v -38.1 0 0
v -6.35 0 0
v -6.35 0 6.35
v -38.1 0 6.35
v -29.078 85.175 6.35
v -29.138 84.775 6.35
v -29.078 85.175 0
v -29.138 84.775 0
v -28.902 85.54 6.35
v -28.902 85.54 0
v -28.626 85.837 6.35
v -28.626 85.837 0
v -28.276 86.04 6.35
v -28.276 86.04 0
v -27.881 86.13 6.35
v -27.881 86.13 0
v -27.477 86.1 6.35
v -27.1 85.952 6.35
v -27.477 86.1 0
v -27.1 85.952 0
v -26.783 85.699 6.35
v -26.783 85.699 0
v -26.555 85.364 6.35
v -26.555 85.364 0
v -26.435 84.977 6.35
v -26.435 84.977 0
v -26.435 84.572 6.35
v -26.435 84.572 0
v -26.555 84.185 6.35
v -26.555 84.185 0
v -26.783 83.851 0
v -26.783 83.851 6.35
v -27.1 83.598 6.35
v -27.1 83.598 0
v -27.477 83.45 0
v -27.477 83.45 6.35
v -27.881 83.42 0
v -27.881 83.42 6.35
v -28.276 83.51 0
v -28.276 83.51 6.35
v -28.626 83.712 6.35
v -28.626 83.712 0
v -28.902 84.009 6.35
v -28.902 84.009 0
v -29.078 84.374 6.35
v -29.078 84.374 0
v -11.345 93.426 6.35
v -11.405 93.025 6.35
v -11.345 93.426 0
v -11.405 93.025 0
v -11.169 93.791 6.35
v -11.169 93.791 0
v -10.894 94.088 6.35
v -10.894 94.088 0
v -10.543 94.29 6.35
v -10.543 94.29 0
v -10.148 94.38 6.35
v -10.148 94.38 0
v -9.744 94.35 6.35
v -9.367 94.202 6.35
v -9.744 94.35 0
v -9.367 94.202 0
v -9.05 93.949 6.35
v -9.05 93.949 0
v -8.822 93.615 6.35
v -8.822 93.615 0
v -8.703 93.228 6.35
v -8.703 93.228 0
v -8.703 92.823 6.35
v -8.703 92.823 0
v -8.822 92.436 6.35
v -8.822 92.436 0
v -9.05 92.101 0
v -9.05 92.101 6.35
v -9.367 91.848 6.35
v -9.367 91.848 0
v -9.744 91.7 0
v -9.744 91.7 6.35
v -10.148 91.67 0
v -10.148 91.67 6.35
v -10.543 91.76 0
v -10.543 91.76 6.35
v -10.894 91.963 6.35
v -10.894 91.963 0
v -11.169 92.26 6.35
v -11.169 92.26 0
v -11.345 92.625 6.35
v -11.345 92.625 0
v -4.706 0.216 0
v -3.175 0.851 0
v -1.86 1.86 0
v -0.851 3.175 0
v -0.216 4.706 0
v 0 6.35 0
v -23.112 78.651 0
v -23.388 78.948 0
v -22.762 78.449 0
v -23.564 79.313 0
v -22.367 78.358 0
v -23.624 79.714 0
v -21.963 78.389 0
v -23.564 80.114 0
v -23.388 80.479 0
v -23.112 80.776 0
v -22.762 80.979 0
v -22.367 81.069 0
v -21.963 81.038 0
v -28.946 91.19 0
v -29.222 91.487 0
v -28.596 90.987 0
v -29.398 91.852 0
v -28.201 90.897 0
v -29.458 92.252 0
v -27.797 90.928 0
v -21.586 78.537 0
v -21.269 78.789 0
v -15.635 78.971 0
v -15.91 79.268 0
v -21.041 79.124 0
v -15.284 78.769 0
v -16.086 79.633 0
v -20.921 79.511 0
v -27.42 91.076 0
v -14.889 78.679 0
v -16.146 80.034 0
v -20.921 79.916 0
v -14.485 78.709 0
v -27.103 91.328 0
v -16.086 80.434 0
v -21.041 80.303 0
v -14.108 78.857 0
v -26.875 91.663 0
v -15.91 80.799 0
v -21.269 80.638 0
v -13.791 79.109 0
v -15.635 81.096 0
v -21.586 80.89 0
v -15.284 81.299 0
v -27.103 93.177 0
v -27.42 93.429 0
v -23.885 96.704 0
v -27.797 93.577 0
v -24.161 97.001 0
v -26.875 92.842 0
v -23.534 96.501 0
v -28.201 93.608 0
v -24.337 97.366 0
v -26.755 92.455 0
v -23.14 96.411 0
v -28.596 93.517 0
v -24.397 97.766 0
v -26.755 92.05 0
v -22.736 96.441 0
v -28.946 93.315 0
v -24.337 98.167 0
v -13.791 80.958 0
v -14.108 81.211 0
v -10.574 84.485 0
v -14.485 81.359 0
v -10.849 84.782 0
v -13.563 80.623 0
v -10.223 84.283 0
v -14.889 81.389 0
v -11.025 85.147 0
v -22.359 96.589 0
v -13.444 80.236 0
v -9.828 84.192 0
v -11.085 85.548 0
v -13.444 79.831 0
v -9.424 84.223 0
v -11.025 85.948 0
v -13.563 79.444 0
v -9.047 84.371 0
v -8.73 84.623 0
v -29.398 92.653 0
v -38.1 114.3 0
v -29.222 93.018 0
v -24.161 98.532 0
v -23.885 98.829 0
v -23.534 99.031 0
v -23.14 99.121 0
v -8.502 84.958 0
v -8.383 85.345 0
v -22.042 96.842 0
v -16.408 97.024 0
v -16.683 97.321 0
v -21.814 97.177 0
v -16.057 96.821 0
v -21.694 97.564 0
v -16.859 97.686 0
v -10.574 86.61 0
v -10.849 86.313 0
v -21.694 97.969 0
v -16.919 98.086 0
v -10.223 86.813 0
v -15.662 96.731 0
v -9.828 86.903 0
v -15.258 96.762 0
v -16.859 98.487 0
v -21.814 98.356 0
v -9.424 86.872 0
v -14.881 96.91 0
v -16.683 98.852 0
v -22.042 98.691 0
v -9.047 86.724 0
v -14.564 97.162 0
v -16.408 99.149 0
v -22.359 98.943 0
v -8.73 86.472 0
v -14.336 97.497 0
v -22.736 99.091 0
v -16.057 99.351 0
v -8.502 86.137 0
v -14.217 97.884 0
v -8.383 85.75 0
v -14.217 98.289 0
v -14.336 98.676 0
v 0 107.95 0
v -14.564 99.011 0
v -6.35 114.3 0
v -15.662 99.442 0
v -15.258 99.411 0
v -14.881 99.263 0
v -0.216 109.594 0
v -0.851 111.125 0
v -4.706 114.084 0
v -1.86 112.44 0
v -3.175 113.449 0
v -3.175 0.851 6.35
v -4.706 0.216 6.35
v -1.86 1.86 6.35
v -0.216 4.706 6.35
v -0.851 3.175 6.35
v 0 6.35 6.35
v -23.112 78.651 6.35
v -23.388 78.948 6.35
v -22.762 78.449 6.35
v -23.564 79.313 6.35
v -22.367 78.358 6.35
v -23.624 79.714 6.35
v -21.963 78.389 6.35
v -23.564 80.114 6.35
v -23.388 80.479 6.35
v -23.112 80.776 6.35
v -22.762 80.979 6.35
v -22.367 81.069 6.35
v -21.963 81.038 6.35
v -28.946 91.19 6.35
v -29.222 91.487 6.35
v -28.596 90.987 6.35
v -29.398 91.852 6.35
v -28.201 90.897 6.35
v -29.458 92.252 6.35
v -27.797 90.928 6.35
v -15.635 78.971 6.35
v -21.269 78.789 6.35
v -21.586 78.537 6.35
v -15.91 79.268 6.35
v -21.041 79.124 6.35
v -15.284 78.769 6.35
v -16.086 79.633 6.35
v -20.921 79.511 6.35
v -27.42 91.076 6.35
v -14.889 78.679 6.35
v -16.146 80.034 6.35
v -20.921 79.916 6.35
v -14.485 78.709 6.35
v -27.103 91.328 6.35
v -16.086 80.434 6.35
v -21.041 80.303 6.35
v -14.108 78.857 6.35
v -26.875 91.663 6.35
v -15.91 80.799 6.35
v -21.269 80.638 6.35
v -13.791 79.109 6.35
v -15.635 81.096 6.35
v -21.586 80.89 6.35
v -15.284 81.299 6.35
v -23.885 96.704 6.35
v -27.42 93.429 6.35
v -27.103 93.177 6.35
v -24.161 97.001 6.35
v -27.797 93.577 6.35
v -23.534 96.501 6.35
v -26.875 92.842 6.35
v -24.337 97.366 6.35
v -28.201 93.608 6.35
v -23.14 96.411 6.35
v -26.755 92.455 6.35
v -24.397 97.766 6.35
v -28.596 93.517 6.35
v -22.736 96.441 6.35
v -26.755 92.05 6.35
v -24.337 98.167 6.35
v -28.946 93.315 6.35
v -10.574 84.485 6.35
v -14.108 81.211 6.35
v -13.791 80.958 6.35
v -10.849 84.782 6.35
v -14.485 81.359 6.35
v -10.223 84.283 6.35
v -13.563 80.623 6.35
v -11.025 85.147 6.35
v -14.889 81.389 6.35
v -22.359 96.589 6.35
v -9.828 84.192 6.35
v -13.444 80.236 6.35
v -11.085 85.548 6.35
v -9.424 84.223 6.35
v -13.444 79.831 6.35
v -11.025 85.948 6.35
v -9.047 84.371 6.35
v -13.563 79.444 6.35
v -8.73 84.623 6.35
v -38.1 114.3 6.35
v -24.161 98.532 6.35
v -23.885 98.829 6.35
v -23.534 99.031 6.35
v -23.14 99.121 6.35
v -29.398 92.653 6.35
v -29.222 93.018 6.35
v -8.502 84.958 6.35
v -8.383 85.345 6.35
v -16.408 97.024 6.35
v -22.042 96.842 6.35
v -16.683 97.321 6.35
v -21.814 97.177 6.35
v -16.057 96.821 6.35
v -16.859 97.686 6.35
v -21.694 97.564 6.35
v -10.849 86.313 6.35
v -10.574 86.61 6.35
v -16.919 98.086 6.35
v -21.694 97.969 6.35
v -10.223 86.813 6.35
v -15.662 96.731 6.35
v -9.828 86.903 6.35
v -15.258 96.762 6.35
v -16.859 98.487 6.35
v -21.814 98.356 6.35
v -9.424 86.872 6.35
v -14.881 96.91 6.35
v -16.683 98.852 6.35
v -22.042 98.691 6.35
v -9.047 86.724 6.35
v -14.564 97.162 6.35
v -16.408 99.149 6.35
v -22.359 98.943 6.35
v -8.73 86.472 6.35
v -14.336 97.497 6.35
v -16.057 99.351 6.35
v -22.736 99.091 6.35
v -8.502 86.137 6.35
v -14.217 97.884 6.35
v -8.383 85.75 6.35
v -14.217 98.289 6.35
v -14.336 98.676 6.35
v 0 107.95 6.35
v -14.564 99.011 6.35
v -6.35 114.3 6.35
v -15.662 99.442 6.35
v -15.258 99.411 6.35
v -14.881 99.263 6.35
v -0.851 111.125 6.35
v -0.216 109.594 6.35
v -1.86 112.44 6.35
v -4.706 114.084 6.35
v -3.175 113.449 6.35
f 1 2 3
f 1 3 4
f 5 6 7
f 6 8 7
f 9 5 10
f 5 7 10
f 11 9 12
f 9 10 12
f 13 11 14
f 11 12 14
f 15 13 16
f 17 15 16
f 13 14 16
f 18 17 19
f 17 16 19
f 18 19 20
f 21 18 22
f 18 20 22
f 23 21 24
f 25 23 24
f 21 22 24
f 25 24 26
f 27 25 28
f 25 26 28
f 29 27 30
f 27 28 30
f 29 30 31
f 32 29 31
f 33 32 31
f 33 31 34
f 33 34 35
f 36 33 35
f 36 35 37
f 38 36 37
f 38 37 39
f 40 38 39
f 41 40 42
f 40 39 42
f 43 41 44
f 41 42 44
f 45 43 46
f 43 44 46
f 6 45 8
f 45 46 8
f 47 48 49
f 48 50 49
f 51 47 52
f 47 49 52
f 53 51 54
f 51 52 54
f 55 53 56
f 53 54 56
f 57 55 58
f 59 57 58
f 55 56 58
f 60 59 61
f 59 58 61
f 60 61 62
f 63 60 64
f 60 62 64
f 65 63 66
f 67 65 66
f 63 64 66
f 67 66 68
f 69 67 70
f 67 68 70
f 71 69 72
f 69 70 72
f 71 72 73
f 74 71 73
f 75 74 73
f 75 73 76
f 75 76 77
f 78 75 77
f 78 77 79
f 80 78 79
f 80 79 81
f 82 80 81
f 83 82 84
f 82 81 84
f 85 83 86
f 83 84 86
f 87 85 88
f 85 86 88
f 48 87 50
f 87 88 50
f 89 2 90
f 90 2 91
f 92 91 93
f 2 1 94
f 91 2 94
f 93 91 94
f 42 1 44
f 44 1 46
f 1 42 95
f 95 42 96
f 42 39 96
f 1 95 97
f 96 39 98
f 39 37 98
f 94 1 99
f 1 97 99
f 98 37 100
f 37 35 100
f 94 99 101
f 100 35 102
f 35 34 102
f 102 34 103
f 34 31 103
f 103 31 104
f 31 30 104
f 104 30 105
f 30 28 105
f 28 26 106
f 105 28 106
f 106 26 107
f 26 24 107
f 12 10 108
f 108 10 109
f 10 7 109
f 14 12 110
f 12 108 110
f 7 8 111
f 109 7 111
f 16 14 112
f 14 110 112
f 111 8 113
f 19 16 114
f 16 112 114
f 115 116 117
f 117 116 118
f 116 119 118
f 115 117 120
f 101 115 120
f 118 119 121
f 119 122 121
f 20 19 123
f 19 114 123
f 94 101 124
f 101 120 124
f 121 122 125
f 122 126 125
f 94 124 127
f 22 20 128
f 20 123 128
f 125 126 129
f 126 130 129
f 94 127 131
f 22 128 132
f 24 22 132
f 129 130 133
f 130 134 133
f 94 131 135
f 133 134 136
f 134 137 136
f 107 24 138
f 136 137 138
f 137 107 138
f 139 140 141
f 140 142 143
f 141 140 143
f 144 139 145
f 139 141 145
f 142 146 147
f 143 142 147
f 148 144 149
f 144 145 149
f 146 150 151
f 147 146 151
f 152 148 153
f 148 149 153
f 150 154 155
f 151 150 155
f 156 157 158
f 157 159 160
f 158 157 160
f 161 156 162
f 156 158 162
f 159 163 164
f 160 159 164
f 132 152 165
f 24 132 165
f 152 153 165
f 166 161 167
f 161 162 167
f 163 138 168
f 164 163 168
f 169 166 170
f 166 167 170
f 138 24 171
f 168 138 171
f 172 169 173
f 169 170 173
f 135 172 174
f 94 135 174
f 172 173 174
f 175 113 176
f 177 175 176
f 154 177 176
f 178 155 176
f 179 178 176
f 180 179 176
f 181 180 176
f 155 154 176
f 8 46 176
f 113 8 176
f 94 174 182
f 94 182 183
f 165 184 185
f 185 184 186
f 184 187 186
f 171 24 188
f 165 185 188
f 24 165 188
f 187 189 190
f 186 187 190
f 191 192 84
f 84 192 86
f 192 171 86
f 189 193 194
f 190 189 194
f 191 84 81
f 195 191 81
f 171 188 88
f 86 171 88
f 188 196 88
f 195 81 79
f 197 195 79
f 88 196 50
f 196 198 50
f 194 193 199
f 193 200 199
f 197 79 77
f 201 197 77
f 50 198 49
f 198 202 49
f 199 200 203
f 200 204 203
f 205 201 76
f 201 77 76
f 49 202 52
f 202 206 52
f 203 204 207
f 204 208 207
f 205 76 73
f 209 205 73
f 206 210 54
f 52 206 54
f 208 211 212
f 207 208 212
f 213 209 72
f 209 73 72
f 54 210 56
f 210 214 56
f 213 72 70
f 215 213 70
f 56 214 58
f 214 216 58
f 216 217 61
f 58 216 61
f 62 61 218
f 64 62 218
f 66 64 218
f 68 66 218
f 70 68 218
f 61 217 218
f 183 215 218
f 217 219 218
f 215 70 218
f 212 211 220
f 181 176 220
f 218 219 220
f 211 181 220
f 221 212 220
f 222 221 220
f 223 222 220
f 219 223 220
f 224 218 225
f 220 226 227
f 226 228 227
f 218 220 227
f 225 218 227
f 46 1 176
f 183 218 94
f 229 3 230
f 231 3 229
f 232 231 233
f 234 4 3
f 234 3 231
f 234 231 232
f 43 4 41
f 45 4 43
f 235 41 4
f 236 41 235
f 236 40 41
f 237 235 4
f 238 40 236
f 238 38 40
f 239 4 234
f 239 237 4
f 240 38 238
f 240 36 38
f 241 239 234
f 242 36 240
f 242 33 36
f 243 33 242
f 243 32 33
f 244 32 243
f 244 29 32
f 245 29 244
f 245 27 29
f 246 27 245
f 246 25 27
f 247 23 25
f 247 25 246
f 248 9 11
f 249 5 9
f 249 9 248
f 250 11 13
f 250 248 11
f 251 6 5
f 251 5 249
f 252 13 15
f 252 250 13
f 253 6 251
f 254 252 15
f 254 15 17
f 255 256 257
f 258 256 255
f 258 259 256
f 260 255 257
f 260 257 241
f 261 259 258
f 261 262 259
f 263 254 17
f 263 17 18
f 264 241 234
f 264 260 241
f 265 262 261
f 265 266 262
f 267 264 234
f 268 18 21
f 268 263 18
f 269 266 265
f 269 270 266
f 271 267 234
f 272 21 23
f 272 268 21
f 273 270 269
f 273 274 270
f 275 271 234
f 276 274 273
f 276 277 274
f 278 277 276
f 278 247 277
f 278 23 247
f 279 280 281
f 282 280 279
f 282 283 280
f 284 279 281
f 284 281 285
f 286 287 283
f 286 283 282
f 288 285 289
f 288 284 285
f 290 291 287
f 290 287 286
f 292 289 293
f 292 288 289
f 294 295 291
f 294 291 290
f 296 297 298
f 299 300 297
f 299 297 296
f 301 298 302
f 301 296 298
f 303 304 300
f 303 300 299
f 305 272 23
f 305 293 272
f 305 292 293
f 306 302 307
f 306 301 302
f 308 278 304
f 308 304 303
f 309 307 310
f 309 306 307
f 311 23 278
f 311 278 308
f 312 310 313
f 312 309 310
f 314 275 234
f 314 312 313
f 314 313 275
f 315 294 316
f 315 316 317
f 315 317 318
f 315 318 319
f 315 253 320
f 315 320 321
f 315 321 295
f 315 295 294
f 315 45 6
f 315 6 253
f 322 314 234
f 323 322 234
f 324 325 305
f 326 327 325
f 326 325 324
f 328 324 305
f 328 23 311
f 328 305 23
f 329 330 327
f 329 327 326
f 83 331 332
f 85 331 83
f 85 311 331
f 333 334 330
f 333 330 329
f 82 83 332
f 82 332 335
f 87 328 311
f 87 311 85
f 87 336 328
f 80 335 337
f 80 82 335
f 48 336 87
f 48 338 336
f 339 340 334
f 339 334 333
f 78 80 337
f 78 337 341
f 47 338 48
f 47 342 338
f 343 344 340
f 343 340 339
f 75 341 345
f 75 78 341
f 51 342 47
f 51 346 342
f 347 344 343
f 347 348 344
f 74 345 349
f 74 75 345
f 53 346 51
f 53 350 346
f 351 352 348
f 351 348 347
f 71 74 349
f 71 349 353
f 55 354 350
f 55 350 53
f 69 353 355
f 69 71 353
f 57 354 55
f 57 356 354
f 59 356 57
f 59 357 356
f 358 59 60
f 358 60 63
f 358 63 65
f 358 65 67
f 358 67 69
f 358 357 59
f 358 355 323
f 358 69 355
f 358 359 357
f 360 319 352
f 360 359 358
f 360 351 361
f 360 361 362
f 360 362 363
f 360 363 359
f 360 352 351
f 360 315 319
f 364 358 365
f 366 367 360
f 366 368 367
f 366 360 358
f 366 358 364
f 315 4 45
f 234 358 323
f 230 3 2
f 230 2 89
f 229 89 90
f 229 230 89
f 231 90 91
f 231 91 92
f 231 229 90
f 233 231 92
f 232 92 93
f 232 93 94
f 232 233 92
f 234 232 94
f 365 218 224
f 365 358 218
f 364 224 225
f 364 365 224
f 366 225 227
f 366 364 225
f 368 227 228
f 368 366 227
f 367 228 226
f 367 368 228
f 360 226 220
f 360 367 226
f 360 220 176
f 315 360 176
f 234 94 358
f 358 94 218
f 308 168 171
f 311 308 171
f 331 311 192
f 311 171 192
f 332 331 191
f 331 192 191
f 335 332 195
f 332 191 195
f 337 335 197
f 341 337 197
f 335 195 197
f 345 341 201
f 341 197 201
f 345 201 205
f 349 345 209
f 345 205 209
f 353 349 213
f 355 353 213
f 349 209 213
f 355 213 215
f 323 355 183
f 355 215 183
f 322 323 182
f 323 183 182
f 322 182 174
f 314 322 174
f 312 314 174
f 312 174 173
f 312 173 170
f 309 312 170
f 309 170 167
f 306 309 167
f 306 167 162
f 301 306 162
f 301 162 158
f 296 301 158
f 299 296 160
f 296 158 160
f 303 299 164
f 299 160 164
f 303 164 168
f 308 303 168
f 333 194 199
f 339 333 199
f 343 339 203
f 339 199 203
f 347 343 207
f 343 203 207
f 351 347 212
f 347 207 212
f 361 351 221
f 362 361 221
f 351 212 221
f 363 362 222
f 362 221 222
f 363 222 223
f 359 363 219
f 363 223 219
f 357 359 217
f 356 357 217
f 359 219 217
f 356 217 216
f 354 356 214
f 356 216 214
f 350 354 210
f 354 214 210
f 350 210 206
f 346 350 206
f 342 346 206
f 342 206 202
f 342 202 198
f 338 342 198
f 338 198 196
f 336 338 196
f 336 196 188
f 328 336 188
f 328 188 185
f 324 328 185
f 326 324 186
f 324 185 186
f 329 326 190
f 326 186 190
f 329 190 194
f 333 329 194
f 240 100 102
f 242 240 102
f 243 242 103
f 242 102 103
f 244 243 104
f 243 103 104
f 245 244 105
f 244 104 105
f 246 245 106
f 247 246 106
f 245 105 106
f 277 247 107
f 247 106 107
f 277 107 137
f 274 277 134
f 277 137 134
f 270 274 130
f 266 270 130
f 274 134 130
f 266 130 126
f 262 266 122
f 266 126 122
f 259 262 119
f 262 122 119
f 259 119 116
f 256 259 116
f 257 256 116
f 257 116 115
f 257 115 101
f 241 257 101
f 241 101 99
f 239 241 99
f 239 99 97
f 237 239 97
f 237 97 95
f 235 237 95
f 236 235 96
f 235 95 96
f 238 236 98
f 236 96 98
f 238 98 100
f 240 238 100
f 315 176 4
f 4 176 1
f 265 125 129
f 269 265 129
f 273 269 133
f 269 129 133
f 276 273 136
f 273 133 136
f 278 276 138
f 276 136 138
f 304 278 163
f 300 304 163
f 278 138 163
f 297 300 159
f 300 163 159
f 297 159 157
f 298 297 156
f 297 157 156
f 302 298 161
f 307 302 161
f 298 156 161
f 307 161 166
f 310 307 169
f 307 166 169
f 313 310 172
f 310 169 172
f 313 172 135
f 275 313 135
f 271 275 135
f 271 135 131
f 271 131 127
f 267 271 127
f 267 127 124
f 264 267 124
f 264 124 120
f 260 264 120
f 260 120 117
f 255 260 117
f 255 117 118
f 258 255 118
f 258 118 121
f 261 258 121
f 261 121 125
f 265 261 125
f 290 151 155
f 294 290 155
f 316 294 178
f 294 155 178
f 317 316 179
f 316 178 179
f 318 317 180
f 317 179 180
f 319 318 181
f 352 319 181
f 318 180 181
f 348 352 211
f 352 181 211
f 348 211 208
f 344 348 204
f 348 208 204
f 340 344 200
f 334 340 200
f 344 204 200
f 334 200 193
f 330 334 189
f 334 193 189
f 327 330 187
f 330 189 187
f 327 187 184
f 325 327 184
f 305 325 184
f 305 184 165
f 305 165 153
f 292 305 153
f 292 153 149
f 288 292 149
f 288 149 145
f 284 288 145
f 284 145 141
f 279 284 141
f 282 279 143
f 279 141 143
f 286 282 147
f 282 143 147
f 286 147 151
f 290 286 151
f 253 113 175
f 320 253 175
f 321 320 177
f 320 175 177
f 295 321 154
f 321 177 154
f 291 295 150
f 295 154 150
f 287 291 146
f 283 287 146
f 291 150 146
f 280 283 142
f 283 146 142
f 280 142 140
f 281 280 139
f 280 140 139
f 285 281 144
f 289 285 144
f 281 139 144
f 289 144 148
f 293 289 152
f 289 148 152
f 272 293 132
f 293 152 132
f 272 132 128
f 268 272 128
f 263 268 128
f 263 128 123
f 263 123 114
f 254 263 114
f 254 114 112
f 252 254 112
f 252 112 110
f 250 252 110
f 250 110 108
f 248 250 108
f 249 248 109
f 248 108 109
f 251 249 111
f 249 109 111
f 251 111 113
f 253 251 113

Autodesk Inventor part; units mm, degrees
ref_plane "YZ Plane" through (0, 0, 0) normal (1, 0, 0) x (0, 1, 0)
ref_plane "XZ Plane" through (0, 0, 0) normal (0, 1, 0) x (-1, 0, 0)
ref_plane "XY Plane" through (0, 0, 0) normal (0, 0, 1) x (1, 0, 0)
sketch "Sketch1" plane through (0, 0, 0) normal (0, 0, 1) x (1, 0, 0)
  line L0 (0, 0) -> (0, 114.3)
  line L1 (0, 0) -> (53.8815, 0) construction
  line L2 (0, 114.3) -> (76.2, 114.3) construction
  line L3 (0, 114.3) -> (-38.1, 114.3)
  line L4 (-38.1, 114.3) -> (-38.1, 0)
  line L5 (0, 0) -> (-38.1, 0)
  dimension "d0" = 114.3
  dimension "d86" = 38.1
extrude "Extrusion1" add sketch "Sketch1" along normal blind 6.35
fillet "Fillet1" radius 6.35 2 edges at (0, 114.3, 3.175) (0, 0, 3.175)
sketch "Sketch8" plane through (0, 0, 0) normal (0, 0, -1) x (-1, 0, 0)
  circle A0 centre (18.9128, 88.9) radius 2.54
  circle A1 centre (10.0465, 93.0252) radius 1.3589
  circle A2 centre (9.7264, 85.5476) radius 1.3589
  circle A3 centre (14.7876, 80.0337) radius 1.3589
  circle A4 centre (22.2652, 79.7136) radius 1.3589
  circle A5 centre (27.7791, 84.7748) radius 1.3589
  circle A6 centre (28.0992, 92.2524) radius 1.3589
  circle A7 centre (23.038, 97.7663) radius 1.3589
  circle A8 centre (15.5603, 98.0864) radius 1.3589
  line L0 (38.1, 0) -> (6.35, 0) projected
  point P0 (0, 0)
  dimension "d60" = 5.08
  dimension "d61" = 2.7178
  dimension "d62" = 9.779
  dimension "d65" = 360
  dimension "d87" = 88.9
extrude "Extrusion7" cut sketch "Sketch8" against normal blind 25.4 contours A1 | A2 | A3 | A4 | A5 | A6 | A7 | A8
sketch "Sketch9" plane through (0, 0, 6.35) normal (0, 0, 1) x (1, 0, 0)
  circle A0 centre (-23.038, 97.7663) radius 1.3589 projected
  circle A1 centre (-14.7876, 80.0337) radius 1.3589 projected
  circle A2 centre (-27.7791, 84.7748) radius 1.3589 projected
  point P0 (0, 0)
  point P1 (-23.2077, 93.1949)
  dimension "d69" = 16.8402
  dimension "d70" = 8.4201
  dimension "d71" = 8.4201
equation "\"d70\" = 0.5 * d69"
equation "\"d71\" = d70"
properties part number "Triangle axle slide connector"
